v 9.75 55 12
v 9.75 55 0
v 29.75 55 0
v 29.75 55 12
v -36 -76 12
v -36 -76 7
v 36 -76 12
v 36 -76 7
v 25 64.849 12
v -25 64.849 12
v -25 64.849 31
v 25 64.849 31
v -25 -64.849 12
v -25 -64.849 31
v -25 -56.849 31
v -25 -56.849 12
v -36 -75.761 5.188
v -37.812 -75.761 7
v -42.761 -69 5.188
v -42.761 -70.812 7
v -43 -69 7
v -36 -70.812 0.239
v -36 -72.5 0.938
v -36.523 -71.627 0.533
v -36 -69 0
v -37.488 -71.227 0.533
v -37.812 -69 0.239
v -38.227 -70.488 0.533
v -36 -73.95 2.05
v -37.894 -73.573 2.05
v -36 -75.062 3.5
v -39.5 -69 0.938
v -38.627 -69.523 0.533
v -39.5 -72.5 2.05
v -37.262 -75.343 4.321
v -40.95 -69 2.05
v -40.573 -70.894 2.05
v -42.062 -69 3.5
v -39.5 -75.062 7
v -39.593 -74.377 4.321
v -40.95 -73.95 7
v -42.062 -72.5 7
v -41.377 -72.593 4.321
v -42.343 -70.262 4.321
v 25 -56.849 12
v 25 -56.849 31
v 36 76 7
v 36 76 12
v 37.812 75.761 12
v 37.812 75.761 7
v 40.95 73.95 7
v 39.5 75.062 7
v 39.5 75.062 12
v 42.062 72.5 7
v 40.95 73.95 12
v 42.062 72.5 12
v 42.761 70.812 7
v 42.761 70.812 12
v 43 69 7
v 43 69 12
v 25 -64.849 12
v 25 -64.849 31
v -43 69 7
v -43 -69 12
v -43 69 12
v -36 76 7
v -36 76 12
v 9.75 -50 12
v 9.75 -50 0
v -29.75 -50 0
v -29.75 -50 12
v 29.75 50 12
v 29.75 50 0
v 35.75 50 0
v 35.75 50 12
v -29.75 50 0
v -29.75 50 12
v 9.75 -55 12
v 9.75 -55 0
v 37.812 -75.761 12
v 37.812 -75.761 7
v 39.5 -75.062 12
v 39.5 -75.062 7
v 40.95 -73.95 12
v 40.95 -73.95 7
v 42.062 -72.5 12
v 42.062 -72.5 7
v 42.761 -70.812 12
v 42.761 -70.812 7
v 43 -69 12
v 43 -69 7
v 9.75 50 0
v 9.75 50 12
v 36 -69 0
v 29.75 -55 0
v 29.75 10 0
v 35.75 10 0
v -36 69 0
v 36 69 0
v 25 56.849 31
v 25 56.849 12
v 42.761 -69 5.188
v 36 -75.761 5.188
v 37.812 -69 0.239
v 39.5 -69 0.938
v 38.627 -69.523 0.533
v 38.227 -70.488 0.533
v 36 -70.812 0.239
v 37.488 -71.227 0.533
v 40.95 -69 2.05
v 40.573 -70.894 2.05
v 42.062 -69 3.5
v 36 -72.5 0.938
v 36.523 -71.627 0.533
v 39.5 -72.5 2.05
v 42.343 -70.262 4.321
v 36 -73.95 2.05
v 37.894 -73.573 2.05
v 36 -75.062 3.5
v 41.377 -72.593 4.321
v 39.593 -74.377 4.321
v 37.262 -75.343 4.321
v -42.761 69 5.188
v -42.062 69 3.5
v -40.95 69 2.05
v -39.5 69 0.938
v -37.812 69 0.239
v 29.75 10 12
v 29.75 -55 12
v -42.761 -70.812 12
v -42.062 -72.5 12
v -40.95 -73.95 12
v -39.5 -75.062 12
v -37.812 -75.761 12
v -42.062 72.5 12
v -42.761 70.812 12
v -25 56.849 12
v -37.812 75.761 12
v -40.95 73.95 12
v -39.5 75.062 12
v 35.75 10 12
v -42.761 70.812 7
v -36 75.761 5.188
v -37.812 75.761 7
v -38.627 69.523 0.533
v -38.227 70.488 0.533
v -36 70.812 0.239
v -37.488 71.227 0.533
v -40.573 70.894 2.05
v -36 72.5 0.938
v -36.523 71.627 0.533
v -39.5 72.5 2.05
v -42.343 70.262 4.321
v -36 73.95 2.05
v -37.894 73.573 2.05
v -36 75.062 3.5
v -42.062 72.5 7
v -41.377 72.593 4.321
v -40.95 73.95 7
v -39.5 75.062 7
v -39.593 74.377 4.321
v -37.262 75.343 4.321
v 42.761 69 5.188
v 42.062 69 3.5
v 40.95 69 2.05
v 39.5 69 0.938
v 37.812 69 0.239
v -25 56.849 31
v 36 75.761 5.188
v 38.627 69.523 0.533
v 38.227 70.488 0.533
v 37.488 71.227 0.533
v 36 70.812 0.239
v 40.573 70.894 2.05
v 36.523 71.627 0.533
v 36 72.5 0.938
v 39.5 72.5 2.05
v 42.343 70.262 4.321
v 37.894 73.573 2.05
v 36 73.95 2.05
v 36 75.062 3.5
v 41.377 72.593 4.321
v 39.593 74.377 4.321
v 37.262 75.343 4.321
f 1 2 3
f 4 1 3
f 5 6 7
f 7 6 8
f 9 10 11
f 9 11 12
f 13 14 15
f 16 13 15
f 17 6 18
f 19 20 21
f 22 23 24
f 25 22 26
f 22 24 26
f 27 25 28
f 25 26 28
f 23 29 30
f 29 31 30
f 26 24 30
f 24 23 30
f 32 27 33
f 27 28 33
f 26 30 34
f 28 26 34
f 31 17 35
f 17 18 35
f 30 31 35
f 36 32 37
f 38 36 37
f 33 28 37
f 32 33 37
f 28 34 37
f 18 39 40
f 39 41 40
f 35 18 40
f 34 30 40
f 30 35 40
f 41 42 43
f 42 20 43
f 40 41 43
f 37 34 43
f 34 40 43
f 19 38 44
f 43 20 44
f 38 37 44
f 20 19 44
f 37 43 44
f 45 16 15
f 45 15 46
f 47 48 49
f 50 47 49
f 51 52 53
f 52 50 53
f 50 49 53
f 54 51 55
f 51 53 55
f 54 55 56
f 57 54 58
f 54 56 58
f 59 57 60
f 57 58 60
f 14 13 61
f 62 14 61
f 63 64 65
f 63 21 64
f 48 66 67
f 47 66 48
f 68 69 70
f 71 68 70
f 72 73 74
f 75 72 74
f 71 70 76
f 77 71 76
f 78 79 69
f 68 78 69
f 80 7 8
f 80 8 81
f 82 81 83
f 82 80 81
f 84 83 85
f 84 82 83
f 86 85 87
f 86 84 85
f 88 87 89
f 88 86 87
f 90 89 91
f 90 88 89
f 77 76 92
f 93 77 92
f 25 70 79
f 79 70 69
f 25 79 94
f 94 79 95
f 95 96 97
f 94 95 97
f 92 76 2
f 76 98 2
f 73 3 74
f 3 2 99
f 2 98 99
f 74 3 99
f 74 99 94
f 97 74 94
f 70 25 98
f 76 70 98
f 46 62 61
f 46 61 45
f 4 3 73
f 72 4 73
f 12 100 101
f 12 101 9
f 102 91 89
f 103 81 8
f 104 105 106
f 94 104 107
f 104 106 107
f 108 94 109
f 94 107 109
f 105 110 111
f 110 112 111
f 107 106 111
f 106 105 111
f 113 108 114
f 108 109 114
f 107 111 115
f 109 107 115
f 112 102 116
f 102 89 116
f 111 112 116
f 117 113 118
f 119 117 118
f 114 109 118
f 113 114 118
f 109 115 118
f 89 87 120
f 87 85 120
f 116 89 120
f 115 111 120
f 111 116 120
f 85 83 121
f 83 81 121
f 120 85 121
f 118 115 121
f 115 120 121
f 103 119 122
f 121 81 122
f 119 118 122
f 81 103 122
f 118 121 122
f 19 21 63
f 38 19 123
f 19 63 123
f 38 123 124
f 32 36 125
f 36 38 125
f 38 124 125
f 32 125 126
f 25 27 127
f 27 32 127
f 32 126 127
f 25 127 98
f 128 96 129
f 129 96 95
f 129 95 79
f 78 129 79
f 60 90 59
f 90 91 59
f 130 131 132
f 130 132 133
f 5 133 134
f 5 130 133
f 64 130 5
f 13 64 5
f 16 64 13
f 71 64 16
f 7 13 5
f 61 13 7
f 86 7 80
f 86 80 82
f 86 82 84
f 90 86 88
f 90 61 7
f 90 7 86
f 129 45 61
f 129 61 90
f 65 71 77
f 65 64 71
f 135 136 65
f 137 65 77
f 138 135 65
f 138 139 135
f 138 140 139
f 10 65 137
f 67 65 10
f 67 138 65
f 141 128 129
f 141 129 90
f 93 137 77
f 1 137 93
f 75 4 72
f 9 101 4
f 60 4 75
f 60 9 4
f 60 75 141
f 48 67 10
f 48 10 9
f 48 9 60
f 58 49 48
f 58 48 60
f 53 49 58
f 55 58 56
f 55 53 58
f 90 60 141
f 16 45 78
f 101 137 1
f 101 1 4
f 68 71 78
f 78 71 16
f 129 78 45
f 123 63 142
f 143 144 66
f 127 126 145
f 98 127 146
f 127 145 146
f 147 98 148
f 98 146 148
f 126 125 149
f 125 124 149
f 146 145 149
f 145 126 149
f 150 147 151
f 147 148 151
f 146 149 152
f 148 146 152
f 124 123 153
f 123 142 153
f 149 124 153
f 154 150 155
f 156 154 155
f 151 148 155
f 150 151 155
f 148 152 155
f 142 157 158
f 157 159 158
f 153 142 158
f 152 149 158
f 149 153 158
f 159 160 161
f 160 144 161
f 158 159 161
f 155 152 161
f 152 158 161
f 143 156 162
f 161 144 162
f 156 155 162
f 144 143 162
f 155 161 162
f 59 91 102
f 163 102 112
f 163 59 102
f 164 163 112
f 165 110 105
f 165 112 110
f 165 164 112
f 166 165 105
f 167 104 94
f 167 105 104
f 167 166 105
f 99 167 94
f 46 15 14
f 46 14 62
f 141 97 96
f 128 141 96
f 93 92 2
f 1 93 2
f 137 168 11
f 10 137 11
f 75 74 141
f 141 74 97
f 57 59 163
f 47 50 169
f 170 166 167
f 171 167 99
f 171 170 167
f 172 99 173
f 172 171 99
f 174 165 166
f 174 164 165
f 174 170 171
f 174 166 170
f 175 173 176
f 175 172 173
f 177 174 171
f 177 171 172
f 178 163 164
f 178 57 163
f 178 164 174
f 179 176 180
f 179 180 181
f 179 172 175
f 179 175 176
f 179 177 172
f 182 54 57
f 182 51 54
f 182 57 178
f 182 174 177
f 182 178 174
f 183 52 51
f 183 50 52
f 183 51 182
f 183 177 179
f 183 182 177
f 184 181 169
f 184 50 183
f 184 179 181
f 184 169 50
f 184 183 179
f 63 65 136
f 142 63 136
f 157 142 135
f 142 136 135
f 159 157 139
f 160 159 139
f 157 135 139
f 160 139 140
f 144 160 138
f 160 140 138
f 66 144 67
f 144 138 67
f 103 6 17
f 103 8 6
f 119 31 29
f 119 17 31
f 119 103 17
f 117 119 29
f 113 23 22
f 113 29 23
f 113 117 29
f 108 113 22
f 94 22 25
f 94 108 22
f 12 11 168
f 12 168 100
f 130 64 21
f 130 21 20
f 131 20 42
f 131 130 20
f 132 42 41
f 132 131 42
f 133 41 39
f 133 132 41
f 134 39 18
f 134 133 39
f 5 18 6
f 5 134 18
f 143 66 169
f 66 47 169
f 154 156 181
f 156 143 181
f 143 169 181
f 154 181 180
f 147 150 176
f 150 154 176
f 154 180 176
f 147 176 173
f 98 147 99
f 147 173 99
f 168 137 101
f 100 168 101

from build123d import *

# Parameters (mm, degrees)
F0_W     = 86
F0_H     = 152
F0_W_2   = 50
F0_H_2   = 8
F1_DEPTH = 12
F2_DEPTH = 31
F3_R     = 7


with BuildPart() as f1:
    # F0 (on Top) → F1 (new body)
    with BuildSketch(Plane.XY):
        Rectangle(F0_W, F0_H)
        with Locations((0, -60.848527)):
            Rectangle(F0_W_2, F0_H_2, mode=Mode.SUBTRACT)
        Polygon((-29.75, -50), (-29.75, 50), (9.75, 50), (9.75, 55), (29.75, 55), (29.75, 50), (35.75, 50), (35.75, 10), (29.75, 10), (29.75, -50), (29.75, -55), (9.75, -55), (9.75, -50), align=None, mode=Mode.SUBTRACT)
        with Locations((0, 60.848527)):
            Rectangle(F0_W_2, F0_H_2, mode=Mode.SUBTRACT)
    extrude(amount=F1_DEPTH)

    # F0 (on Top) → F2 (join)
    with BuildSketch(Plane.XY):
        with Locations((0, 60.848527)):
            Rectangle(F0_W_2, F0_H_2)
        with Locations((0, -60.848527)):
            Rectangle(F0_W_2, F0_H_2)
    extrude(amount=F2_DEPTH)

    # F3
    f3_edges = [f1.edges().sort_by_distance(p)[0] for p in [
        (-43, -76, 6),
        (43, -76, 6),
        (43, 76, 6),
        (-43, 76, 6),
        (43, 0, 0),
        (0, -76, 0),
        (-43, 0, 0),
        (0, 76, 0),
    ]]
    fillet(f3_edges, radius=F3_R)


solid = f1.part
